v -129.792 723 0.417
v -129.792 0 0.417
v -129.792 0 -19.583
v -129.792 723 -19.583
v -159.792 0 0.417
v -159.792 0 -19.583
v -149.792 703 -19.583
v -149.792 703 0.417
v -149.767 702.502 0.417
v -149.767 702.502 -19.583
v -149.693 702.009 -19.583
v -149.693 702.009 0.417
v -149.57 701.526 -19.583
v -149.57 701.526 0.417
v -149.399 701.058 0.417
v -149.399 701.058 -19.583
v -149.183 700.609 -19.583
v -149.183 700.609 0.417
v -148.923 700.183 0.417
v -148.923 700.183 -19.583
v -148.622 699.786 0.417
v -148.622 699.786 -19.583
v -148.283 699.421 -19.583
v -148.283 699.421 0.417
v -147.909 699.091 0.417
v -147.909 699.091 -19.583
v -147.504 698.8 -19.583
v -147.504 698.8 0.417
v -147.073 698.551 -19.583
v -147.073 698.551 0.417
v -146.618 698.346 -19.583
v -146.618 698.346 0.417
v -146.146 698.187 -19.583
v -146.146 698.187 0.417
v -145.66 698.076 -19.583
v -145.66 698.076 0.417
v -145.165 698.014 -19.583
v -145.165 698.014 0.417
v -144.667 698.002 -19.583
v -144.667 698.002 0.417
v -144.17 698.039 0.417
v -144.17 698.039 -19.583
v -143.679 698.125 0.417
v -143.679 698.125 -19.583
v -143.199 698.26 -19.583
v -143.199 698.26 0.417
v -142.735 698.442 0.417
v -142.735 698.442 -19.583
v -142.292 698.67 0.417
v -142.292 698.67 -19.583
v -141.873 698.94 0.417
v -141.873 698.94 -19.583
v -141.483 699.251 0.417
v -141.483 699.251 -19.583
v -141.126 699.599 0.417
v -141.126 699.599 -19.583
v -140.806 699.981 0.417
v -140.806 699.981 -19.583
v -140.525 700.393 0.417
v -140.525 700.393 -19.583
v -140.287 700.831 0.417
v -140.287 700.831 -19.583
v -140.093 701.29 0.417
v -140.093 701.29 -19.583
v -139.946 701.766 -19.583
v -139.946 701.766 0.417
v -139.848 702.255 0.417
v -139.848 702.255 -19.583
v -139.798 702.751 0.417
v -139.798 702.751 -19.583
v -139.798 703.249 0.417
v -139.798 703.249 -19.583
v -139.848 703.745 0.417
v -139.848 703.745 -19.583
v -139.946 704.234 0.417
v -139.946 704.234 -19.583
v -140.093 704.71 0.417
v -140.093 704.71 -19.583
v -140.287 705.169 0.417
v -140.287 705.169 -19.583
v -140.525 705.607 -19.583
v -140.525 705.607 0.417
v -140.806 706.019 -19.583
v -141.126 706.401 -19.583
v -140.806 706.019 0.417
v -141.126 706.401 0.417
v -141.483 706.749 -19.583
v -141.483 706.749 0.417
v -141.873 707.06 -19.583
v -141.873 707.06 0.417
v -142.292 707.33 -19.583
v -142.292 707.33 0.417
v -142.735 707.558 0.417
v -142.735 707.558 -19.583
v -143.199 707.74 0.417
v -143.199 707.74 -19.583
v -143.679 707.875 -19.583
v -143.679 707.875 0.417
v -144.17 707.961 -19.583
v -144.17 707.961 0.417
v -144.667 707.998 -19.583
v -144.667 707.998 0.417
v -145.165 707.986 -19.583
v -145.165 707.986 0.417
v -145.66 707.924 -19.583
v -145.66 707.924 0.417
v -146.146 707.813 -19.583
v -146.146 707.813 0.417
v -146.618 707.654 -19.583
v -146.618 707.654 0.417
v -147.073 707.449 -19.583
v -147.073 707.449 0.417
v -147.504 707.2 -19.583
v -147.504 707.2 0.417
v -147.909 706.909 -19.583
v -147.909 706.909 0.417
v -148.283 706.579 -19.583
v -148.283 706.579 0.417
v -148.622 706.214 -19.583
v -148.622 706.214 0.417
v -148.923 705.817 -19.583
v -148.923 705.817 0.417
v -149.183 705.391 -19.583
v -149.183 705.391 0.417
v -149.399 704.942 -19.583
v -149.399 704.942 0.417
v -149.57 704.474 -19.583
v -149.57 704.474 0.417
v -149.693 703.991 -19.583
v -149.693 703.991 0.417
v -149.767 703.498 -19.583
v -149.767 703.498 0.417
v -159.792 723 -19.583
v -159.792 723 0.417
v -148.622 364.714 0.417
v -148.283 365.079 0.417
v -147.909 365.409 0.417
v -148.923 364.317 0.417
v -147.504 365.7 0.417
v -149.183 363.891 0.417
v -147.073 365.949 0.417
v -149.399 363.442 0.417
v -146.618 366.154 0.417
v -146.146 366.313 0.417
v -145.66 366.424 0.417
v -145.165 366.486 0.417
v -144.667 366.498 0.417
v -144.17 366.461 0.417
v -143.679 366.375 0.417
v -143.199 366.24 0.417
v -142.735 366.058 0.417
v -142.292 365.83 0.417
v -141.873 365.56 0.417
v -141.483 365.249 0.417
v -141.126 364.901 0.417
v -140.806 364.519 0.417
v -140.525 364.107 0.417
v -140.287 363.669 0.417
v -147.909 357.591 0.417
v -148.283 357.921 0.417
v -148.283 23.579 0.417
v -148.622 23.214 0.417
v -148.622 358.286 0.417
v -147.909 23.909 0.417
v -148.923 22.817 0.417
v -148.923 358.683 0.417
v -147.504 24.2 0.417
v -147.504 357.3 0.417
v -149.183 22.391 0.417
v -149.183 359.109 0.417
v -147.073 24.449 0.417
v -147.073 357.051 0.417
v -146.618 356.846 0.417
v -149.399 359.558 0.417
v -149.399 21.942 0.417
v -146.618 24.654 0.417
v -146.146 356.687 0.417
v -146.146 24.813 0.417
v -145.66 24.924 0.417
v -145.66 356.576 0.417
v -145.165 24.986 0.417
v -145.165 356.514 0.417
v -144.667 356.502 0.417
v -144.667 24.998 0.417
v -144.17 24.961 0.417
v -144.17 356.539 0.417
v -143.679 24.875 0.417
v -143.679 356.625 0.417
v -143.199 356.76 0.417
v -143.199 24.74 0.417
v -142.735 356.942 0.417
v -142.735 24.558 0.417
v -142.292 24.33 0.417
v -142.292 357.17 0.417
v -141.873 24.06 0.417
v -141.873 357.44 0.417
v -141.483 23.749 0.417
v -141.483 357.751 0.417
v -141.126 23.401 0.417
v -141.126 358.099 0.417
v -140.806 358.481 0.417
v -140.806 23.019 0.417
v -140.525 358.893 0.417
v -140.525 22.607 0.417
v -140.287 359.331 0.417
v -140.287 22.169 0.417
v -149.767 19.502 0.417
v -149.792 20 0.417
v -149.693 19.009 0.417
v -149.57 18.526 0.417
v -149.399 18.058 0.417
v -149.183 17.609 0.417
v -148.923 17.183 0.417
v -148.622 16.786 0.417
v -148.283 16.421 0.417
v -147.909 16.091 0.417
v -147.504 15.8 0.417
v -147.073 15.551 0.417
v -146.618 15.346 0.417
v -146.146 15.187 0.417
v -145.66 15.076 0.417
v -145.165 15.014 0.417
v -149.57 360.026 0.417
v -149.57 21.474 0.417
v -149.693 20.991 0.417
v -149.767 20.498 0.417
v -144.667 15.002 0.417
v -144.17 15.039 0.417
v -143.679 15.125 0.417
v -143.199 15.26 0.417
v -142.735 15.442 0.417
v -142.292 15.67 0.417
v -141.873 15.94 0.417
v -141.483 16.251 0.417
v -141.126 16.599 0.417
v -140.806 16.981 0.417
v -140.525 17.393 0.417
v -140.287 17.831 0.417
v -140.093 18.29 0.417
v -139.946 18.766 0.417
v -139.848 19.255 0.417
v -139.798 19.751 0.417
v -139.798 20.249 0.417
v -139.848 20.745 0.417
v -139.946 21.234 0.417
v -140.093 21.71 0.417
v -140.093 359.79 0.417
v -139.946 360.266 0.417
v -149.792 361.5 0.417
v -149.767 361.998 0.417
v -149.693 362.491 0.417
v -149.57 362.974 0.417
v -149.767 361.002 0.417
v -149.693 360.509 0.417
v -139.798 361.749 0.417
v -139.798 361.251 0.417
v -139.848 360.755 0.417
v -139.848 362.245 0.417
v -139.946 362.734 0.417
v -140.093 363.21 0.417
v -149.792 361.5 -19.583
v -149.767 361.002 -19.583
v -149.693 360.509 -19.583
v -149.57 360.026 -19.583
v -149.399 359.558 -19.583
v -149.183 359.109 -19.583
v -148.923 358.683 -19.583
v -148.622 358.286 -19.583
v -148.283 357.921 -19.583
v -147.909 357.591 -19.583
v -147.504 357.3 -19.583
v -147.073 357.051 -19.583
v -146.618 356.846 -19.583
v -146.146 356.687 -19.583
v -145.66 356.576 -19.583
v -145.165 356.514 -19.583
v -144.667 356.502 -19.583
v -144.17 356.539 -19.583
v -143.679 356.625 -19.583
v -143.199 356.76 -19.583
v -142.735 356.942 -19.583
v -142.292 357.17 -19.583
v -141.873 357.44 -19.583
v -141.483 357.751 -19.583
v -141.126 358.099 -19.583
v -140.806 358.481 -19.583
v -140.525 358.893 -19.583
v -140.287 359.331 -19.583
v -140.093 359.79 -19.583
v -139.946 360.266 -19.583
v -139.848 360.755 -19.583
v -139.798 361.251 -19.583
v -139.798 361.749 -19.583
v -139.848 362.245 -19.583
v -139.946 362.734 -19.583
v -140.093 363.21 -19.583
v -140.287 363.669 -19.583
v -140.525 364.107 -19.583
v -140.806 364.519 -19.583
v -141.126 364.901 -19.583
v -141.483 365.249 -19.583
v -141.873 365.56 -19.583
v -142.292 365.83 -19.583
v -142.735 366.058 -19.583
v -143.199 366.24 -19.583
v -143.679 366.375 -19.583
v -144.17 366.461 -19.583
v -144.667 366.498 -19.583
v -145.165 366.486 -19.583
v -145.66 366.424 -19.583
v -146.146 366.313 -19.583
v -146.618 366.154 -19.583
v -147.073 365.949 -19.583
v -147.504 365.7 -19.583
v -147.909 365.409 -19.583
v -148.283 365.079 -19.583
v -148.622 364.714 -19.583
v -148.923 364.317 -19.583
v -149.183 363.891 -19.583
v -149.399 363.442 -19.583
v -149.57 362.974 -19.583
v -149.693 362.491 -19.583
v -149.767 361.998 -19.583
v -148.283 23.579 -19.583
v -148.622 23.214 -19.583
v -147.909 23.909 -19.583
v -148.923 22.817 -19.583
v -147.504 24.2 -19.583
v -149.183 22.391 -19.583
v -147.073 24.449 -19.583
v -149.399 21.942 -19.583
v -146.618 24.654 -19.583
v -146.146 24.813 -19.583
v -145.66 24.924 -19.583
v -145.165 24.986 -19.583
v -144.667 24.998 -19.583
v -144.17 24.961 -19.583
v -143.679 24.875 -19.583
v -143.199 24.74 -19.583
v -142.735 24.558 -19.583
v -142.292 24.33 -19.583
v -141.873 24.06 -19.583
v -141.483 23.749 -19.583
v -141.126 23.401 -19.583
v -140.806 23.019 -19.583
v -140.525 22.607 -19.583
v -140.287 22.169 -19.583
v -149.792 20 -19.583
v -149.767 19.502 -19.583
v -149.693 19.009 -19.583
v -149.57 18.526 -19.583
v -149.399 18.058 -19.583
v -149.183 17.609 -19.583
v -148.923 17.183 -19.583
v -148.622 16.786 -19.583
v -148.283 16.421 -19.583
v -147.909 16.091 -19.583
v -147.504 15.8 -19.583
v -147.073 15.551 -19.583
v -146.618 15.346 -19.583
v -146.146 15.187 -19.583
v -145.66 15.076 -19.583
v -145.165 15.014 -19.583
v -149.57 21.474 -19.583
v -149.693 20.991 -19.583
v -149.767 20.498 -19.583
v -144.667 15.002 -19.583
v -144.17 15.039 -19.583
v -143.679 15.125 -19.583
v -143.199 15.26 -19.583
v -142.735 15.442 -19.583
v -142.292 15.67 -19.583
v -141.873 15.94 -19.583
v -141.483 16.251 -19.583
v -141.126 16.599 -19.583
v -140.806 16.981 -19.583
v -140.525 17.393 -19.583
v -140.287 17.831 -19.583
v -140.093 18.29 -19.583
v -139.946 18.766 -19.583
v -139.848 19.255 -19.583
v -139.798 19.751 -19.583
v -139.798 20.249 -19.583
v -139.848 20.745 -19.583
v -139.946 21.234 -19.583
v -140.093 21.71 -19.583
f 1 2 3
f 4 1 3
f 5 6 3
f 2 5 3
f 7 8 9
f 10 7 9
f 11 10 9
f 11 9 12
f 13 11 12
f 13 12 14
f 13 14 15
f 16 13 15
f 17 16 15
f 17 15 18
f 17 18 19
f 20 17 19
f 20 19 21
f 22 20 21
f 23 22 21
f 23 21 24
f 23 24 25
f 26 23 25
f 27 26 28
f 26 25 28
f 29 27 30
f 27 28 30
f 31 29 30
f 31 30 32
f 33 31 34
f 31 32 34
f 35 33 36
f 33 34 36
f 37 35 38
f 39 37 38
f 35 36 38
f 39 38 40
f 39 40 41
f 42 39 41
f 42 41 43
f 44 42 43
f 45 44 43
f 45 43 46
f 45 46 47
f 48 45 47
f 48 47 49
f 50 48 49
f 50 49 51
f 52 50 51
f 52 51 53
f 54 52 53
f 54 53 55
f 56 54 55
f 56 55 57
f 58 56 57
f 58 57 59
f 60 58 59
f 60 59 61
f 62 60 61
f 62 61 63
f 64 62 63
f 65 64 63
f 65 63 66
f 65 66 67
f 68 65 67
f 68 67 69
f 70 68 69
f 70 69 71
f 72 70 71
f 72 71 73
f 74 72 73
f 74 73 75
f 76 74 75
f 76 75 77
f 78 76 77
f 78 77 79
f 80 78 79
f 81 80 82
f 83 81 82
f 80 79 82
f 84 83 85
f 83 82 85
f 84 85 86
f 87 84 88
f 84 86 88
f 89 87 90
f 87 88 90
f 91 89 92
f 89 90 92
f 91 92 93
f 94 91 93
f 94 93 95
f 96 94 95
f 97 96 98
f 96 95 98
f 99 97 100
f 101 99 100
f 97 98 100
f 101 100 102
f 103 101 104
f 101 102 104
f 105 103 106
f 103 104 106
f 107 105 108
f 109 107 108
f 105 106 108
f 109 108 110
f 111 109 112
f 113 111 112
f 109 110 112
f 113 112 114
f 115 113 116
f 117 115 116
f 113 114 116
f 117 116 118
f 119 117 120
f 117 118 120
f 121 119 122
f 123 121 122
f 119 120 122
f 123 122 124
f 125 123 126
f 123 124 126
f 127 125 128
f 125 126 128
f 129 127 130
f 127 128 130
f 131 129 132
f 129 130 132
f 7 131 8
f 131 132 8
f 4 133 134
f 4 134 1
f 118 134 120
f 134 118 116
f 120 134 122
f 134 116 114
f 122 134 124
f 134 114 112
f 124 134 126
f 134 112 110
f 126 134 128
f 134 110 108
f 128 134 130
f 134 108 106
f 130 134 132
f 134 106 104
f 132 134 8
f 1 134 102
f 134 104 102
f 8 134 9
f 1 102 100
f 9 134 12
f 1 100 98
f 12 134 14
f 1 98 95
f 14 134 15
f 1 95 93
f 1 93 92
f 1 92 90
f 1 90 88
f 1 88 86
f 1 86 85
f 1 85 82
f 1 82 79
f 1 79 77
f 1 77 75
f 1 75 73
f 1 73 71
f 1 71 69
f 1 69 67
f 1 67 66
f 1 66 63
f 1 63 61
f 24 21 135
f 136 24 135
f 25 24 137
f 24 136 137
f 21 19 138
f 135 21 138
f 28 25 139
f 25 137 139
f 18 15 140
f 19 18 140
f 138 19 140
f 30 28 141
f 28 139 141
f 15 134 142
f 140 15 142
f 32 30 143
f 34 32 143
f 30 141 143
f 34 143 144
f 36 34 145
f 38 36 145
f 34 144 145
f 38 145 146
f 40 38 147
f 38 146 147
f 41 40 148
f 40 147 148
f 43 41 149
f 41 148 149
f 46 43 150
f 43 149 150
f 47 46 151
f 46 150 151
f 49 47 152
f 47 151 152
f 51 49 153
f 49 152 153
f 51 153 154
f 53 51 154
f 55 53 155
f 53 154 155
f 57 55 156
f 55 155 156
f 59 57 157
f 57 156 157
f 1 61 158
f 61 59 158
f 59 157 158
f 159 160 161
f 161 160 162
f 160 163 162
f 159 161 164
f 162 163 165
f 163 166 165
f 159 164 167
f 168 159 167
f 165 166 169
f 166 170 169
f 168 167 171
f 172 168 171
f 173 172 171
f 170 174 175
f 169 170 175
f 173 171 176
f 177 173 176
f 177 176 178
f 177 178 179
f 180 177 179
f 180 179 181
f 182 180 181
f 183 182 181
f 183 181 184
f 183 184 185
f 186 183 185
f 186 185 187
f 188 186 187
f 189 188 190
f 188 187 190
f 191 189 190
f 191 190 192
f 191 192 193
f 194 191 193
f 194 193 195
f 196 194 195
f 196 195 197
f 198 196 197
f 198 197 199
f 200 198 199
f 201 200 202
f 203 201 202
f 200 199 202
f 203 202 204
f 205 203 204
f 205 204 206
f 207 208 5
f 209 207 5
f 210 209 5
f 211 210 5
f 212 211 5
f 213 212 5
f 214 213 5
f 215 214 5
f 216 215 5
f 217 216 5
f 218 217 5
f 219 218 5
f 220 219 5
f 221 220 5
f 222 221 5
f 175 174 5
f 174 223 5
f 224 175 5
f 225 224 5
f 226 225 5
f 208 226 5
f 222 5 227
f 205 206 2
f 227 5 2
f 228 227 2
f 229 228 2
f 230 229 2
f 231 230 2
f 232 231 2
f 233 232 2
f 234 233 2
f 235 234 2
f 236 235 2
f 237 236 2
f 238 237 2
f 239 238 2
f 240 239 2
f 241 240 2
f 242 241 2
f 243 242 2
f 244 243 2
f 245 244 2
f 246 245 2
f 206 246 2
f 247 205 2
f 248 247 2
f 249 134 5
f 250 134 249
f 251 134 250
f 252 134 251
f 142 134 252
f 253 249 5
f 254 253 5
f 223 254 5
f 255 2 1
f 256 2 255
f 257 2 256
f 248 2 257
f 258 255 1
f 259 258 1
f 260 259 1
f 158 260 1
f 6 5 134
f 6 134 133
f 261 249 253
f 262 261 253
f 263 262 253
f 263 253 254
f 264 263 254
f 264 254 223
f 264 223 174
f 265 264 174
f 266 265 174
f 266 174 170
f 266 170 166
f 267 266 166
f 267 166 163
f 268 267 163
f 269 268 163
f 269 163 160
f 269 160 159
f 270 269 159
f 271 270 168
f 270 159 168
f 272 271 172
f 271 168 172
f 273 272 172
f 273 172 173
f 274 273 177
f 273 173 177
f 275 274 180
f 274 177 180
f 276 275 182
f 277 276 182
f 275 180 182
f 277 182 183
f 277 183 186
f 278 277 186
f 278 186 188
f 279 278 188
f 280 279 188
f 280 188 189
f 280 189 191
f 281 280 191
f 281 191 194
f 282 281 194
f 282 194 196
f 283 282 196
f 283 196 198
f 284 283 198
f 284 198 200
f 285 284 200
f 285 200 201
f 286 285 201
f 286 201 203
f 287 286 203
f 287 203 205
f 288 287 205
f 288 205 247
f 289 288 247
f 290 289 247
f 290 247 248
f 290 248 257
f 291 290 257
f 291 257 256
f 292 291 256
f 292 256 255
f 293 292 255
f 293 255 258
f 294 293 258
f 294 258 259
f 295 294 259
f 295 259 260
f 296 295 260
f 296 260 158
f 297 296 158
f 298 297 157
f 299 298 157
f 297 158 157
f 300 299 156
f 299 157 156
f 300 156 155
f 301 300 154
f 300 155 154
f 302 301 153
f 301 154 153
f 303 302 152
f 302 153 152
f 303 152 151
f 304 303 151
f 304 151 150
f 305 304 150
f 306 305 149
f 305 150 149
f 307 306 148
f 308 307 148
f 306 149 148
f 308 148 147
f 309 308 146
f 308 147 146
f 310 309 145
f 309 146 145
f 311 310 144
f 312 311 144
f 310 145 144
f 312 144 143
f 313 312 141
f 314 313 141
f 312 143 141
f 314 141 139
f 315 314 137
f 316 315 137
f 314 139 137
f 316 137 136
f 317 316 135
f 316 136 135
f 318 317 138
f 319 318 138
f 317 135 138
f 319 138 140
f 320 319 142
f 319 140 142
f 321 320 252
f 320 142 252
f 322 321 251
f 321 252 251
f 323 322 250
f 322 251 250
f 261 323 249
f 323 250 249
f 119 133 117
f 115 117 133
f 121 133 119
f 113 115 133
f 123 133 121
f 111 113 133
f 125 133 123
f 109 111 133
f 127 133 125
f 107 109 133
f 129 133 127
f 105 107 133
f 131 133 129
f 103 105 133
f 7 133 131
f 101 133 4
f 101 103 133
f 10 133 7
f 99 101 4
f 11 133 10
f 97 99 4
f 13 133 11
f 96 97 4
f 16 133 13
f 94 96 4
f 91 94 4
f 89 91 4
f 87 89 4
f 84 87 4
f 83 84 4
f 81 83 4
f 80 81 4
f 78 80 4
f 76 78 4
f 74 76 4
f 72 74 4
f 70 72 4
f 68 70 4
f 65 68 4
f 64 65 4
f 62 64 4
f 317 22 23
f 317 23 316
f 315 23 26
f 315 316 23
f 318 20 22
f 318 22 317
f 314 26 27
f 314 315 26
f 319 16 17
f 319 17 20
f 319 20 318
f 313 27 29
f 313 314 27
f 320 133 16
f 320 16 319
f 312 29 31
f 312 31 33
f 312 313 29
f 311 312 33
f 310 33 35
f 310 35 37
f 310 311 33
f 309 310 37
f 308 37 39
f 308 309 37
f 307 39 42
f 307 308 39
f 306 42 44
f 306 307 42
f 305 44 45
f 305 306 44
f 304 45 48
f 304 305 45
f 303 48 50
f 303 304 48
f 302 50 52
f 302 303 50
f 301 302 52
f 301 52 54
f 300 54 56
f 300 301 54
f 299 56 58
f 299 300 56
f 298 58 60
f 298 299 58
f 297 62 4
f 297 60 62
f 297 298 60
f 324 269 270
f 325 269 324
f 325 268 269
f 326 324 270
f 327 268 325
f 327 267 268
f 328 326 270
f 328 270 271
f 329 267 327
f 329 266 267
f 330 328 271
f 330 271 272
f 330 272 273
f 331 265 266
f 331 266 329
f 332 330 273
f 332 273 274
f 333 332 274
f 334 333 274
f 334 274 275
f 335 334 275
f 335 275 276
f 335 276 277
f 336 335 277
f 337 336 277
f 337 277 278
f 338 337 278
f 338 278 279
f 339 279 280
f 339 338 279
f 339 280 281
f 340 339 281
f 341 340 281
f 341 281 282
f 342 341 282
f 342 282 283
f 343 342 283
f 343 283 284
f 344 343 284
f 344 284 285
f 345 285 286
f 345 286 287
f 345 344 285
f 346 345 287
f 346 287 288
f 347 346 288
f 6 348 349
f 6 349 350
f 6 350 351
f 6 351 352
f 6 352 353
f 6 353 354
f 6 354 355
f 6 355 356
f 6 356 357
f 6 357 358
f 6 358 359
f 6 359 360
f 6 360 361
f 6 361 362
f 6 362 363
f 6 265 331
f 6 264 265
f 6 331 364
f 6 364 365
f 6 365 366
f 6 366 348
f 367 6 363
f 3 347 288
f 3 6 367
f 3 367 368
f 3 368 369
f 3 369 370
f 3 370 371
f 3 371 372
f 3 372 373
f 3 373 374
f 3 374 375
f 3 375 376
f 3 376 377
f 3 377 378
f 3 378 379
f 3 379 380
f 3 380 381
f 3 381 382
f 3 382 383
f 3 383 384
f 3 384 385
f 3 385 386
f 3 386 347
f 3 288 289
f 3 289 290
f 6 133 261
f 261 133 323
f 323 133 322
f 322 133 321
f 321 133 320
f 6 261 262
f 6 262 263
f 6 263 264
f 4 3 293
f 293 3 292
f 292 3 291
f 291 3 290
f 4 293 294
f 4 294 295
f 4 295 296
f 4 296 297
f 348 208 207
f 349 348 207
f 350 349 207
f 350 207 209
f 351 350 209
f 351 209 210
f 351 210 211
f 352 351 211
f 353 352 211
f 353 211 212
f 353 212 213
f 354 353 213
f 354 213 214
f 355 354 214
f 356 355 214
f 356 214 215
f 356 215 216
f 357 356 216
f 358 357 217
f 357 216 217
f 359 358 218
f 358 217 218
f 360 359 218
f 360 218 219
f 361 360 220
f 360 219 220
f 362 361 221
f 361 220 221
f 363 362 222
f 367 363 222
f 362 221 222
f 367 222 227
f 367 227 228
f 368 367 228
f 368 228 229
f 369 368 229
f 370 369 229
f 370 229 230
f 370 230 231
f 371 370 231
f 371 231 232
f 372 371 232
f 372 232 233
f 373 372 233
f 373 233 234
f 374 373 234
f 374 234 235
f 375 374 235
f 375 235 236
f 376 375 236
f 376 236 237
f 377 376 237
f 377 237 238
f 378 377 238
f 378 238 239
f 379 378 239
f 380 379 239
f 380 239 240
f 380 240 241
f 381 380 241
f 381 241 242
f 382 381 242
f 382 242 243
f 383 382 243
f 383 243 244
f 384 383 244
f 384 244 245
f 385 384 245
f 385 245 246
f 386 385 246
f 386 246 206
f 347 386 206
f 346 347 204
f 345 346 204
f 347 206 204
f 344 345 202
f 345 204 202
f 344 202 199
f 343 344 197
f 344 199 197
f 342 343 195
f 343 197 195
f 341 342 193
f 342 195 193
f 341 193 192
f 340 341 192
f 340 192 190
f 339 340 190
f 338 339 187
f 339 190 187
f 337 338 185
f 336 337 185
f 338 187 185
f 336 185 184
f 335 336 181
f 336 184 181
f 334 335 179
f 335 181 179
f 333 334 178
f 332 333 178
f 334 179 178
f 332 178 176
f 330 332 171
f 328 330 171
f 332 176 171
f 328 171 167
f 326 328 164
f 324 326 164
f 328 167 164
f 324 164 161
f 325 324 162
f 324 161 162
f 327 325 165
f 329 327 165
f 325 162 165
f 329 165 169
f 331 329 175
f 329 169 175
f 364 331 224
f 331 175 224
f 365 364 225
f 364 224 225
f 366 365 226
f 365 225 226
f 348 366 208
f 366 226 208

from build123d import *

# Parameters (mm, degrees)
SKETCH1_W           = 30
SKETCH1_H           = 20
BOSS_EXTRUDE1_DEPTH = 723
CUT_EXTRUDE1_DEPTH  = 25


with BuildPart() as part:
    # Sketch1 → Boss-Extrude1 (new body)
    with BuildSketch(Plane(origin=(0, 0, 0), x_dir=(1, 0, 0), z_dir=(0, 1, 0))):
        with Locations((-144.791666667, 9.583333333)):
            Rectangle(SKETCH1_W, SKETCH1_H)
    extrude(amount=BOSS_EXTRUDE1_DEPTH)

    # Sketch2 → Cut-Extrude1 (cut)
    with BuildSketch(Plane.XY.offset(0.416666667)):
        with BuildLine():
            ThreePointArc((-139.791666667, 703), (-144.791666667, 708), (-149.791666667, 703))
            Line((-149.791666667, 703), (-139.791666667, 703))
        make_face()
        with BuildLine():
            Line((-139.791666667, 703), (-149.791666667, 703))
            ThreePointArc((-149.791666667, 703), (-144.791666667, 698), (-139.791666667, 703))
        make_face()
        with BuildLine():
            ThreePointArc((-139.791666667, 361.5), (-144.791666667, 366.5), (-149.791666667, 361.5))
            Line((-149.791666667, 361.5), (-139.791666667, 361.5))
        make_face()
        with BuildLine():
            Line((-139.791666667, 361.5), (-149.791666667, 361.5))
            ThreePointArc((-149.791666667, 361.5), (-144.791666667, 356.5), (-139.791666667, 361.5))
        make_face()
        with BuildLine():
            ThreePointArc((-139.791666667, 20), (-144.791666667, 25), (-149.791666667, 20))
            Line((-149.791666667, 20), (-139.791666667, 20))
        make_face()
        with BuildLine():
            Line((-139.791666667, 20), (-149.791666667, 20))
            ThreePointArc((-149.791666667, 20), (-144.791666667, 15), (-139.791666667, 20))
        make_face()
    extrude(amount=-CUT_EXTRUDE1_DEPTH, mode=Mode.SUBTRACT)


solid = part.part
